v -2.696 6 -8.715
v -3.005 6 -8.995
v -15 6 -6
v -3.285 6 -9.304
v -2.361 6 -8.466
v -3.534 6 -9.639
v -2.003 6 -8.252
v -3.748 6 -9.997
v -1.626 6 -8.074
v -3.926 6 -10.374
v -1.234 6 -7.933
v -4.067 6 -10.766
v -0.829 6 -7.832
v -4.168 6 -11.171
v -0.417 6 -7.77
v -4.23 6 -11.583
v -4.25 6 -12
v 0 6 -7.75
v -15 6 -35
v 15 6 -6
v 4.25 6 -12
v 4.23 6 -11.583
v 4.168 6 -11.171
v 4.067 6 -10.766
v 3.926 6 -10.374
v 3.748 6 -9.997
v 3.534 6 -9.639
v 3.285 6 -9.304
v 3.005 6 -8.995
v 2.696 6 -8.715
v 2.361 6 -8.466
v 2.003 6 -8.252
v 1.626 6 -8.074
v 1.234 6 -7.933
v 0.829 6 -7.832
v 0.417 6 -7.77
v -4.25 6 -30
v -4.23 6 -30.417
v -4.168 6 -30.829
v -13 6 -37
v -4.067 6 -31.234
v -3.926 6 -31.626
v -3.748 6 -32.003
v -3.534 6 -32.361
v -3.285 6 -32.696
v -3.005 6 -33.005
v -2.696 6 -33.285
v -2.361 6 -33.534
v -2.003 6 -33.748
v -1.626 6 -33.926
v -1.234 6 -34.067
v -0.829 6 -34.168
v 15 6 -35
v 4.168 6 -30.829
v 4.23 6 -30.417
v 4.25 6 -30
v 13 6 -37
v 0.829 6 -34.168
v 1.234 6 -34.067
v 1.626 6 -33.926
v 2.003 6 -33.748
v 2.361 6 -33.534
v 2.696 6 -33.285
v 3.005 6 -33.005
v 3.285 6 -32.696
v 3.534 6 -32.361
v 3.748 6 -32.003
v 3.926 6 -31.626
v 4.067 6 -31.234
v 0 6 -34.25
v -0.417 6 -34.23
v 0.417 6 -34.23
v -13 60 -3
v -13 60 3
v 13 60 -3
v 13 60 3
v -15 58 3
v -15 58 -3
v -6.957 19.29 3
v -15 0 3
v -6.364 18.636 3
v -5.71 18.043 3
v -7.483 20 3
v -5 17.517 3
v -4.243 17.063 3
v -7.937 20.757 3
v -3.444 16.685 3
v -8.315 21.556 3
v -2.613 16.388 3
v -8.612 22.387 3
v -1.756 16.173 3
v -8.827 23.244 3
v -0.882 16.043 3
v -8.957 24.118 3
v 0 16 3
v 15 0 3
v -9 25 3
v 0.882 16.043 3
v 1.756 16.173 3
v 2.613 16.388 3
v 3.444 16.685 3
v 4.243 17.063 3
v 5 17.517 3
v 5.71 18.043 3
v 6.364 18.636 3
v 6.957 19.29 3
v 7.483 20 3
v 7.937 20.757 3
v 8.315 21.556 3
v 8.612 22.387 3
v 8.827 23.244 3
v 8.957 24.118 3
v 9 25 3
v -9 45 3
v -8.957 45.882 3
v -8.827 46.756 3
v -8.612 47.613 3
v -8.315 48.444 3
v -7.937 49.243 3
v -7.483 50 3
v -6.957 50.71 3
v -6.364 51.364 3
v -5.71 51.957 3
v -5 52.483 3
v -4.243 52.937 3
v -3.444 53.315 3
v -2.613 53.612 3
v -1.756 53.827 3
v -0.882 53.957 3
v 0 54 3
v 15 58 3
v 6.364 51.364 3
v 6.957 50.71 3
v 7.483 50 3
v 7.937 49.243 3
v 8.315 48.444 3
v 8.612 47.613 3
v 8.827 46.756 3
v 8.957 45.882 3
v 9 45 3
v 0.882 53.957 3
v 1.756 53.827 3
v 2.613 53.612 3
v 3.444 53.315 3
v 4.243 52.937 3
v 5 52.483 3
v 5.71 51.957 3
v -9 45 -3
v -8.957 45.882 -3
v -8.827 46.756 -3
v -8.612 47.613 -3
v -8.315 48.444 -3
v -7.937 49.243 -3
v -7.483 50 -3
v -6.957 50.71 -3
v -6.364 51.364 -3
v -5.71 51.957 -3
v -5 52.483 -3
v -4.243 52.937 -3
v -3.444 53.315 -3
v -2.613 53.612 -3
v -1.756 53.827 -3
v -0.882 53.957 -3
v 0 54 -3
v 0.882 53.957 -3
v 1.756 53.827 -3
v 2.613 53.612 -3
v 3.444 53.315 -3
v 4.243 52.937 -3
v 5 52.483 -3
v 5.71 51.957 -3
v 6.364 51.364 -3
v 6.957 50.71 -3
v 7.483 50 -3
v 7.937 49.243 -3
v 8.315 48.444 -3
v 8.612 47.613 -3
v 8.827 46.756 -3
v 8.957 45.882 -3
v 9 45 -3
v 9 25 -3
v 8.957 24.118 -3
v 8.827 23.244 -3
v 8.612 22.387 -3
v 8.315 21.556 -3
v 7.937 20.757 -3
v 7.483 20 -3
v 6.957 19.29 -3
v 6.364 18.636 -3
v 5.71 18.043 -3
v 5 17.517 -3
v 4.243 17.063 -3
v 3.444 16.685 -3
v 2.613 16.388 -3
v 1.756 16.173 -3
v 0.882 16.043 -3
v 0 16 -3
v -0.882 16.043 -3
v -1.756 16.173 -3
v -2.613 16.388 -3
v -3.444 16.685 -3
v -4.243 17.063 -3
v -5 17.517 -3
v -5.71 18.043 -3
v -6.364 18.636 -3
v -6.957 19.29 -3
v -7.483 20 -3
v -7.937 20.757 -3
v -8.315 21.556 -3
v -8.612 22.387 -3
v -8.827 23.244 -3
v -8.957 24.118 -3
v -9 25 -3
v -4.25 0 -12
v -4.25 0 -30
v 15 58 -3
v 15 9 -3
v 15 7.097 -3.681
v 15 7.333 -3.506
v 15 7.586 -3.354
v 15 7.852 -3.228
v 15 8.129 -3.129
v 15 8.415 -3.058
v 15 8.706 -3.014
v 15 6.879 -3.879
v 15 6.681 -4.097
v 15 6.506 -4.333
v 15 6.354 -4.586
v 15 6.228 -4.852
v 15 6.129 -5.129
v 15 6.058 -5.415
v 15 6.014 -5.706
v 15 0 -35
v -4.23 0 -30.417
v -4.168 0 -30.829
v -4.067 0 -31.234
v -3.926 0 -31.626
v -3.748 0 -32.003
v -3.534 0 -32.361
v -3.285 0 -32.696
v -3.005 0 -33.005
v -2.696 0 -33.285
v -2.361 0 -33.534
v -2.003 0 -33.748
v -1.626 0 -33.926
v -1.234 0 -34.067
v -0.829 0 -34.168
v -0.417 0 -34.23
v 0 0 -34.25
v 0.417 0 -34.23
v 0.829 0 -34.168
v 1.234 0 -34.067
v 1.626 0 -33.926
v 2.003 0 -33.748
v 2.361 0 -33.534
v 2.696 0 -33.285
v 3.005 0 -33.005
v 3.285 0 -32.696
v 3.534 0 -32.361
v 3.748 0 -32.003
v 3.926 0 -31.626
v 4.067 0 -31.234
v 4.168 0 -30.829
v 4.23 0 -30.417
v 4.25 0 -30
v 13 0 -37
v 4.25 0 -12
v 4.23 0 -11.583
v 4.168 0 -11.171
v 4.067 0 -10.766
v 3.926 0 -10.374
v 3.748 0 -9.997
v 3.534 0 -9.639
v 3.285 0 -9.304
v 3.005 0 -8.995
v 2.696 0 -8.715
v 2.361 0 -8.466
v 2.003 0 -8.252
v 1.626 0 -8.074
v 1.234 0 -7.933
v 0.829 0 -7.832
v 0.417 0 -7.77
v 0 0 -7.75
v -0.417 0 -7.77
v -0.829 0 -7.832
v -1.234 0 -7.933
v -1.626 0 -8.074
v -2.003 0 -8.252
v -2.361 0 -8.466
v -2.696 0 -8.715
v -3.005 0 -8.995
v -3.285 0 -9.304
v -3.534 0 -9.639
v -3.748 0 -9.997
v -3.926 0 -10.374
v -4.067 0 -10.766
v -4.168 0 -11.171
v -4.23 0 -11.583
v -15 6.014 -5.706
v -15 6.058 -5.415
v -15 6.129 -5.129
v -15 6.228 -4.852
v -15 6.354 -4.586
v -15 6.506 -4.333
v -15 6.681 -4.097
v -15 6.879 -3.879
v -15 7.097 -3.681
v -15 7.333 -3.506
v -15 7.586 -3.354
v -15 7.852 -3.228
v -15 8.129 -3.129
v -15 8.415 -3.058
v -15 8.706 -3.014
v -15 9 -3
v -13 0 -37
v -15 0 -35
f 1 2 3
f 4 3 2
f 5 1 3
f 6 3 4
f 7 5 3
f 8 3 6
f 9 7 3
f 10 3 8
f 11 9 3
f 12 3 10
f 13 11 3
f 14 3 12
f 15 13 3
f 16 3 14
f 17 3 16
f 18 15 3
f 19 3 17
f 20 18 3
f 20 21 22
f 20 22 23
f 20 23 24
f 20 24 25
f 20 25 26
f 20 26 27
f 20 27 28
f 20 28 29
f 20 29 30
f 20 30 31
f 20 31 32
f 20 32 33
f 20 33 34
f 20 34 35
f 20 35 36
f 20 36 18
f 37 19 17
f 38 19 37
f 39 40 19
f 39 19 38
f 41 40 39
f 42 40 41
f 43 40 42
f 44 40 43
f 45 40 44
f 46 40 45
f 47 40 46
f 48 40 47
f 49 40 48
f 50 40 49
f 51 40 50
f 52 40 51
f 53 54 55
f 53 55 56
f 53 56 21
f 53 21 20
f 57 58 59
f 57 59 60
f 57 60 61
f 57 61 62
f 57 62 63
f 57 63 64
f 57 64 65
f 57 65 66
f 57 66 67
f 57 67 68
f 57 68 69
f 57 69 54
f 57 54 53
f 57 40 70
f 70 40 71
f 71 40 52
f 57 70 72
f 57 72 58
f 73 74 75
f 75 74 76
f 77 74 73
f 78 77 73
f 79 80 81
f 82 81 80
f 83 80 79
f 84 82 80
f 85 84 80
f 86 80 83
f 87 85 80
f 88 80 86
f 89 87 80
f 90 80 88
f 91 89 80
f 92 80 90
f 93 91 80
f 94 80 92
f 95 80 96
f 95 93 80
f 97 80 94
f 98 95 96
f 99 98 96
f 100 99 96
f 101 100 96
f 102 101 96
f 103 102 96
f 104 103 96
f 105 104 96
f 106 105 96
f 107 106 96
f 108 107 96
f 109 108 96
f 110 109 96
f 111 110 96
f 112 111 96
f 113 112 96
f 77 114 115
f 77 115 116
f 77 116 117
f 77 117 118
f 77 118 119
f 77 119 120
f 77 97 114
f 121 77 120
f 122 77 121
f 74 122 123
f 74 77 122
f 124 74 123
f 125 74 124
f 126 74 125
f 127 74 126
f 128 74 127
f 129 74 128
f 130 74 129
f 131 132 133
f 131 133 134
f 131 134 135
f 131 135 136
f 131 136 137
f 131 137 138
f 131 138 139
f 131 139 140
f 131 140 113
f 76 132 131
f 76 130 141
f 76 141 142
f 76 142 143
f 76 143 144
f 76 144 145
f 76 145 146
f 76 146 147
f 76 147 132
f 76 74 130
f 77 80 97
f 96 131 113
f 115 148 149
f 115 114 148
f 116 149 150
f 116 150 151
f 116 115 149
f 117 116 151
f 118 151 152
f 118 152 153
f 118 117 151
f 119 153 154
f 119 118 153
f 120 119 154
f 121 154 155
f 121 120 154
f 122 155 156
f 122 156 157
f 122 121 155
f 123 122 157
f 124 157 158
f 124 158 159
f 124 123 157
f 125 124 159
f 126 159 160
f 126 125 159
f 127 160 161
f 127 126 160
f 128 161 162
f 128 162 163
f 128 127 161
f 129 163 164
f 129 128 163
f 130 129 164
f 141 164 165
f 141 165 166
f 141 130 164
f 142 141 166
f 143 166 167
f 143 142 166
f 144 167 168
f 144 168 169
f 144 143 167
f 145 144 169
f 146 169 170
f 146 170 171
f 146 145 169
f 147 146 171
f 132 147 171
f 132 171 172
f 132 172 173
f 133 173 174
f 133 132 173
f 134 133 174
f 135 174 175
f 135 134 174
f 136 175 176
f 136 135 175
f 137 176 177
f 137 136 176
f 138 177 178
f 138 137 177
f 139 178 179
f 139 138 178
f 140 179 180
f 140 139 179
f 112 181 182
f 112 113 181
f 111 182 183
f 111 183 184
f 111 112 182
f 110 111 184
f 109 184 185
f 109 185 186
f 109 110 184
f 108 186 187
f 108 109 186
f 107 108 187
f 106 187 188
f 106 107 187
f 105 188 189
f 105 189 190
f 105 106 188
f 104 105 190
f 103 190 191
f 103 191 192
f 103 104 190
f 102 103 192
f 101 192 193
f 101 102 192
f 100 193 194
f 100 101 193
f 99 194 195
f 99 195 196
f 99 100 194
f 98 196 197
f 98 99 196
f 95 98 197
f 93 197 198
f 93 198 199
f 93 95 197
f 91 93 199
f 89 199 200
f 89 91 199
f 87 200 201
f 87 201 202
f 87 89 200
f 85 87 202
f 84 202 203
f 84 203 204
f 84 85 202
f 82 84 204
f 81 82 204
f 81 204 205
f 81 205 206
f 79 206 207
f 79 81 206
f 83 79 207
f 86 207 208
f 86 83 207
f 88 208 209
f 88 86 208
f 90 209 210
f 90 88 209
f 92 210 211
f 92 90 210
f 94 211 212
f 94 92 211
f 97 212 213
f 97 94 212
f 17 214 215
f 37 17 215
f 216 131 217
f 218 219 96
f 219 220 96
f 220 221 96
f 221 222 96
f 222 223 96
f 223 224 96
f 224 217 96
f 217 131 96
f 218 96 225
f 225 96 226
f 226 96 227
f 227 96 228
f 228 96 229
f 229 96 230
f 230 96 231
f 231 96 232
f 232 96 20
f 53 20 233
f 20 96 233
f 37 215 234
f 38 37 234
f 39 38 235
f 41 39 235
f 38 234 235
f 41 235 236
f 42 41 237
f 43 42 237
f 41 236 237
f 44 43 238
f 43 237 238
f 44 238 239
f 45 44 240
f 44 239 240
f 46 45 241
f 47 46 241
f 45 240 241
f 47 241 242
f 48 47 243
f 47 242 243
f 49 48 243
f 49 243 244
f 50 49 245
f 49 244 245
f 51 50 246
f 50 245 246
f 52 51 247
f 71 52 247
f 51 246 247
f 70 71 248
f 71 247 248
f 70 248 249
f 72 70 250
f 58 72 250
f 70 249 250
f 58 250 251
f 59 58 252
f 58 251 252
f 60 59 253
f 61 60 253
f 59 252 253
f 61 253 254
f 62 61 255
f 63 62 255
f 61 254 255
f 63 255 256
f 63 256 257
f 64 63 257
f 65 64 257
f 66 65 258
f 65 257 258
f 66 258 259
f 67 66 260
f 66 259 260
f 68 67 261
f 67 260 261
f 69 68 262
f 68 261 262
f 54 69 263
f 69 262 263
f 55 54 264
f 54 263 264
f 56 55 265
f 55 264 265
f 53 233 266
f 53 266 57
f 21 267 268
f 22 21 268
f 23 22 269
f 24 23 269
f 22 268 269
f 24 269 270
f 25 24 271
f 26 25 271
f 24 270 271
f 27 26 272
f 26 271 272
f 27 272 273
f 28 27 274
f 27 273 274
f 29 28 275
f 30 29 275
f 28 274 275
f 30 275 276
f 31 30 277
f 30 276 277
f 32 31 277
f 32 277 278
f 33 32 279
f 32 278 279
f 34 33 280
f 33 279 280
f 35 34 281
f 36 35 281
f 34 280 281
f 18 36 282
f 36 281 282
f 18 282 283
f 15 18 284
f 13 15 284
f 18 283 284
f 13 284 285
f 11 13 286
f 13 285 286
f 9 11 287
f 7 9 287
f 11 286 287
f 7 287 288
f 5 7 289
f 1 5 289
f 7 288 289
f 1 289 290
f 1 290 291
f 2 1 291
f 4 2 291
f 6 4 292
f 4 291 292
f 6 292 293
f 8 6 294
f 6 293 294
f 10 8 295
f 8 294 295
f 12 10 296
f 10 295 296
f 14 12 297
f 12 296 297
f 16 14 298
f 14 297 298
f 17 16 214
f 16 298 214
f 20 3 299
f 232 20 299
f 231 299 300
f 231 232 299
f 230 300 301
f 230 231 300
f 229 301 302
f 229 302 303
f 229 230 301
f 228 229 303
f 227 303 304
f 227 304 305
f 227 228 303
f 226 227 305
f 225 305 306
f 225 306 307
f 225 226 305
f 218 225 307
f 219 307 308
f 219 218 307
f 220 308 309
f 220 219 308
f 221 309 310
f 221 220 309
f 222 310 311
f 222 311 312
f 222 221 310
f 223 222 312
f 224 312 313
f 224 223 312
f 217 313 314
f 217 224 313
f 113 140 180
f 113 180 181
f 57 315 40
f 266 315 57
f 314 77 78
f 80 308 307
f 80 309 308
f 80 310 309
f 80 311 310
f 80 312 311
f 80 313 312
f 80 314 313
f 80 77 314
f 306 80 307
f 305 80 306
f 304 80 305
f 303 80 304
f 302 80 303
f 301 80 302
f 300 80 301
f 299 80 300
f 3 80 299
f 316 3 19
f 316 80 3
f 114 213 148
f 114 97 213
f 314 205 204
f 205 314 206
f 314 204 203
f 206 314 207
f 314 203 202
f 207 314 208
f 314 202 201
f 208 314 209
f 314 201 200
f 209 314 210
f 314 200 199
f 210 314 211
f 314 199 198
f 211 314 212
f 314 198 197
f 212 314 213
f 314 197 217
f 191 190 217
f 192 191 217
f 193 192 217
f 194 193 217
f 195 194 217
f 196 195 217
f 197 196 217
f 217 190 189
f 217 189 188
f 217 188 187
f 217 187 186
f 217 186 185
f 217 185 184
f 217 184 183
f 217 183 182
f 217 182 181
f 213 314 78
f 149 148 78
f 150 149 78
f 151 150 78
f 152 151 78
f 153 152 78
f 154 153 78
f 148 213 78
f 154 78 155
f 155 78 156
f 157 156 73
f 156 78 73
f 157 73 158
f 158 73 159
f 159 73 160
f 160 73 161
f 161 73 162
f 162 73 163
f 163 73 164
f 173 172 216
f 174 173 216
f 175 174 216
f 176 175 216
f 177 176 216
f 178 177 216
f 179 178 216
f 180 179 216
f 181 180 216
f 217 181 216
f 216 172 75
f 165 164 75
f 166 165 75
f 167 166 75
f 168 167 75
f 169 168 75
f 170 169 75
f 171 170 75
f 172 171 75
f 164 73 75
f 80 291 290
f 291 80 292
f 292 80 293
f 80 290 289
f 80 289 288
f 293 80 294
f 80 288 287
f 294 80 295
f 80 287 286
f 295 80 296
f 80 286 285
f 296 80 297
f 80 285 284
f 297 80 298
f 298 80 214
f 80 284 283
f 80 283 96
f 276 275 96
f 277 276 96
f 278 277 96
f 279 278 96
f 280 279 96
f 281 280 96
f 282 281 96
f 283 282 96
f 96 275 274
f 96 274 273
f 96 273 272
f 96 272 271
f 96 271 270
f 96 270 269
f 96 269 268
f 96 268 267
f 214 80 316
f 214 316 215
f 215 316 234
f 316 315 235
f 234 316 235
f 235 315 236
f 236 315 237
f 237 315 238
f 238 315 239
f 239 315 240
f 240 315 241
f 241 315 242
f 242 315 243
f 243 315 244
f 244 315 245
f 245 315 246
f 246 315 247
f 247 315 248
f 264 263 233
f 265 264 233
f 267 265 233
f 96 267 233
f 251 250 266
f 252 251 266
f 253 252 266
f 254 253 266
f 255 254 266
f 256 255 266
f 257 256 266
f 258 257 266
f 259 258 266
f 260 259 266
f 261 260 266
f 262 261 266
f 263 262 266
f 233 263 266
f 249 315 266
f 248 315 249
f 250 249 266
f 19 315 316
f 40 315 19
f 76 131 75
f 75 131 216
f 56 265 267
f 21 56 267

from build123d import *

# Parameters (mm, degrees)
SKETCH1_W           = 30
SKETCH1_H           = 60
BOSS_EXTRUDE1_DEPTH = 3
SKETCH3_W           = 30
SKETCH3_H           = 34
BOSS_EXTRUDE2_DEPTH = 6
FILLET1_R           = 3
CHAMFER1_SIZE       = 2


with BuildPart() as part:
    # Sketch1 → Boss-Extrude1 (new body, symmetric)
    with BuildSketch(Plane.XY):
        with Locations((0, 30)):
            Rectangle(SKETCH1_W, SKETCH1_H)
        with BuildLine():
            Line((9, 45), (9, 25))
            ThreePointArc((9, 25), (0, 16), (-9, 25))
            Line((-9, 25), (-9, 45))
            ThreePointArc((-9, 45), (0, 54), (9, 45))
        make_face(mode=Mode.SUBTRACT)
    extrude(amount=BOSS_EXTRUDE1_DEPTH, both=True)

    # Sketch3 → Boss-Extrude2 (add)
    with BuildSketch(Plane(origin=(0, 0, 0), x_dir=(1, 0, 0), z_dir=(0, 1, 0))):
        with Locations((0, 20)):
            Rectangle(SKETCH3_W, SKETCH3_H)
        with BuildLine():
            Line((4.25, 30), (4.25, 12))
            ThreePointArc((4.25, 12), (0, 7.75), (-4.25, 12))
            Line((-4.25, 12), (-4.25, 30))
            ThreePointArc((-4.25, 30), (0, 34.25), (4.25, 30))
        make_face(mode=Mode.SUBTRACT)
    extrude(amount=BOSS_EXTRUDE2_DEPTH)

    # Fillet1
    fillet1_edges = [part.edges().sort_by_distance(p)[0] for p in [
        (0, 6, -3),
    ]]
    fillet(fillet1_edges, radius=FILLET1_R)

    # Chamfer1
    chamfer1_edges = [part.edges().sort_by_distance(p)[0] for p in [
        (-15, 3, -37),
        (15, 3, -37),
        (-15, 60, 0),
        (15, 60, 0),
    ]]
    chamfer(chamfer1_edges, length=CHAMFER1_SIZE)


solid = part.part
